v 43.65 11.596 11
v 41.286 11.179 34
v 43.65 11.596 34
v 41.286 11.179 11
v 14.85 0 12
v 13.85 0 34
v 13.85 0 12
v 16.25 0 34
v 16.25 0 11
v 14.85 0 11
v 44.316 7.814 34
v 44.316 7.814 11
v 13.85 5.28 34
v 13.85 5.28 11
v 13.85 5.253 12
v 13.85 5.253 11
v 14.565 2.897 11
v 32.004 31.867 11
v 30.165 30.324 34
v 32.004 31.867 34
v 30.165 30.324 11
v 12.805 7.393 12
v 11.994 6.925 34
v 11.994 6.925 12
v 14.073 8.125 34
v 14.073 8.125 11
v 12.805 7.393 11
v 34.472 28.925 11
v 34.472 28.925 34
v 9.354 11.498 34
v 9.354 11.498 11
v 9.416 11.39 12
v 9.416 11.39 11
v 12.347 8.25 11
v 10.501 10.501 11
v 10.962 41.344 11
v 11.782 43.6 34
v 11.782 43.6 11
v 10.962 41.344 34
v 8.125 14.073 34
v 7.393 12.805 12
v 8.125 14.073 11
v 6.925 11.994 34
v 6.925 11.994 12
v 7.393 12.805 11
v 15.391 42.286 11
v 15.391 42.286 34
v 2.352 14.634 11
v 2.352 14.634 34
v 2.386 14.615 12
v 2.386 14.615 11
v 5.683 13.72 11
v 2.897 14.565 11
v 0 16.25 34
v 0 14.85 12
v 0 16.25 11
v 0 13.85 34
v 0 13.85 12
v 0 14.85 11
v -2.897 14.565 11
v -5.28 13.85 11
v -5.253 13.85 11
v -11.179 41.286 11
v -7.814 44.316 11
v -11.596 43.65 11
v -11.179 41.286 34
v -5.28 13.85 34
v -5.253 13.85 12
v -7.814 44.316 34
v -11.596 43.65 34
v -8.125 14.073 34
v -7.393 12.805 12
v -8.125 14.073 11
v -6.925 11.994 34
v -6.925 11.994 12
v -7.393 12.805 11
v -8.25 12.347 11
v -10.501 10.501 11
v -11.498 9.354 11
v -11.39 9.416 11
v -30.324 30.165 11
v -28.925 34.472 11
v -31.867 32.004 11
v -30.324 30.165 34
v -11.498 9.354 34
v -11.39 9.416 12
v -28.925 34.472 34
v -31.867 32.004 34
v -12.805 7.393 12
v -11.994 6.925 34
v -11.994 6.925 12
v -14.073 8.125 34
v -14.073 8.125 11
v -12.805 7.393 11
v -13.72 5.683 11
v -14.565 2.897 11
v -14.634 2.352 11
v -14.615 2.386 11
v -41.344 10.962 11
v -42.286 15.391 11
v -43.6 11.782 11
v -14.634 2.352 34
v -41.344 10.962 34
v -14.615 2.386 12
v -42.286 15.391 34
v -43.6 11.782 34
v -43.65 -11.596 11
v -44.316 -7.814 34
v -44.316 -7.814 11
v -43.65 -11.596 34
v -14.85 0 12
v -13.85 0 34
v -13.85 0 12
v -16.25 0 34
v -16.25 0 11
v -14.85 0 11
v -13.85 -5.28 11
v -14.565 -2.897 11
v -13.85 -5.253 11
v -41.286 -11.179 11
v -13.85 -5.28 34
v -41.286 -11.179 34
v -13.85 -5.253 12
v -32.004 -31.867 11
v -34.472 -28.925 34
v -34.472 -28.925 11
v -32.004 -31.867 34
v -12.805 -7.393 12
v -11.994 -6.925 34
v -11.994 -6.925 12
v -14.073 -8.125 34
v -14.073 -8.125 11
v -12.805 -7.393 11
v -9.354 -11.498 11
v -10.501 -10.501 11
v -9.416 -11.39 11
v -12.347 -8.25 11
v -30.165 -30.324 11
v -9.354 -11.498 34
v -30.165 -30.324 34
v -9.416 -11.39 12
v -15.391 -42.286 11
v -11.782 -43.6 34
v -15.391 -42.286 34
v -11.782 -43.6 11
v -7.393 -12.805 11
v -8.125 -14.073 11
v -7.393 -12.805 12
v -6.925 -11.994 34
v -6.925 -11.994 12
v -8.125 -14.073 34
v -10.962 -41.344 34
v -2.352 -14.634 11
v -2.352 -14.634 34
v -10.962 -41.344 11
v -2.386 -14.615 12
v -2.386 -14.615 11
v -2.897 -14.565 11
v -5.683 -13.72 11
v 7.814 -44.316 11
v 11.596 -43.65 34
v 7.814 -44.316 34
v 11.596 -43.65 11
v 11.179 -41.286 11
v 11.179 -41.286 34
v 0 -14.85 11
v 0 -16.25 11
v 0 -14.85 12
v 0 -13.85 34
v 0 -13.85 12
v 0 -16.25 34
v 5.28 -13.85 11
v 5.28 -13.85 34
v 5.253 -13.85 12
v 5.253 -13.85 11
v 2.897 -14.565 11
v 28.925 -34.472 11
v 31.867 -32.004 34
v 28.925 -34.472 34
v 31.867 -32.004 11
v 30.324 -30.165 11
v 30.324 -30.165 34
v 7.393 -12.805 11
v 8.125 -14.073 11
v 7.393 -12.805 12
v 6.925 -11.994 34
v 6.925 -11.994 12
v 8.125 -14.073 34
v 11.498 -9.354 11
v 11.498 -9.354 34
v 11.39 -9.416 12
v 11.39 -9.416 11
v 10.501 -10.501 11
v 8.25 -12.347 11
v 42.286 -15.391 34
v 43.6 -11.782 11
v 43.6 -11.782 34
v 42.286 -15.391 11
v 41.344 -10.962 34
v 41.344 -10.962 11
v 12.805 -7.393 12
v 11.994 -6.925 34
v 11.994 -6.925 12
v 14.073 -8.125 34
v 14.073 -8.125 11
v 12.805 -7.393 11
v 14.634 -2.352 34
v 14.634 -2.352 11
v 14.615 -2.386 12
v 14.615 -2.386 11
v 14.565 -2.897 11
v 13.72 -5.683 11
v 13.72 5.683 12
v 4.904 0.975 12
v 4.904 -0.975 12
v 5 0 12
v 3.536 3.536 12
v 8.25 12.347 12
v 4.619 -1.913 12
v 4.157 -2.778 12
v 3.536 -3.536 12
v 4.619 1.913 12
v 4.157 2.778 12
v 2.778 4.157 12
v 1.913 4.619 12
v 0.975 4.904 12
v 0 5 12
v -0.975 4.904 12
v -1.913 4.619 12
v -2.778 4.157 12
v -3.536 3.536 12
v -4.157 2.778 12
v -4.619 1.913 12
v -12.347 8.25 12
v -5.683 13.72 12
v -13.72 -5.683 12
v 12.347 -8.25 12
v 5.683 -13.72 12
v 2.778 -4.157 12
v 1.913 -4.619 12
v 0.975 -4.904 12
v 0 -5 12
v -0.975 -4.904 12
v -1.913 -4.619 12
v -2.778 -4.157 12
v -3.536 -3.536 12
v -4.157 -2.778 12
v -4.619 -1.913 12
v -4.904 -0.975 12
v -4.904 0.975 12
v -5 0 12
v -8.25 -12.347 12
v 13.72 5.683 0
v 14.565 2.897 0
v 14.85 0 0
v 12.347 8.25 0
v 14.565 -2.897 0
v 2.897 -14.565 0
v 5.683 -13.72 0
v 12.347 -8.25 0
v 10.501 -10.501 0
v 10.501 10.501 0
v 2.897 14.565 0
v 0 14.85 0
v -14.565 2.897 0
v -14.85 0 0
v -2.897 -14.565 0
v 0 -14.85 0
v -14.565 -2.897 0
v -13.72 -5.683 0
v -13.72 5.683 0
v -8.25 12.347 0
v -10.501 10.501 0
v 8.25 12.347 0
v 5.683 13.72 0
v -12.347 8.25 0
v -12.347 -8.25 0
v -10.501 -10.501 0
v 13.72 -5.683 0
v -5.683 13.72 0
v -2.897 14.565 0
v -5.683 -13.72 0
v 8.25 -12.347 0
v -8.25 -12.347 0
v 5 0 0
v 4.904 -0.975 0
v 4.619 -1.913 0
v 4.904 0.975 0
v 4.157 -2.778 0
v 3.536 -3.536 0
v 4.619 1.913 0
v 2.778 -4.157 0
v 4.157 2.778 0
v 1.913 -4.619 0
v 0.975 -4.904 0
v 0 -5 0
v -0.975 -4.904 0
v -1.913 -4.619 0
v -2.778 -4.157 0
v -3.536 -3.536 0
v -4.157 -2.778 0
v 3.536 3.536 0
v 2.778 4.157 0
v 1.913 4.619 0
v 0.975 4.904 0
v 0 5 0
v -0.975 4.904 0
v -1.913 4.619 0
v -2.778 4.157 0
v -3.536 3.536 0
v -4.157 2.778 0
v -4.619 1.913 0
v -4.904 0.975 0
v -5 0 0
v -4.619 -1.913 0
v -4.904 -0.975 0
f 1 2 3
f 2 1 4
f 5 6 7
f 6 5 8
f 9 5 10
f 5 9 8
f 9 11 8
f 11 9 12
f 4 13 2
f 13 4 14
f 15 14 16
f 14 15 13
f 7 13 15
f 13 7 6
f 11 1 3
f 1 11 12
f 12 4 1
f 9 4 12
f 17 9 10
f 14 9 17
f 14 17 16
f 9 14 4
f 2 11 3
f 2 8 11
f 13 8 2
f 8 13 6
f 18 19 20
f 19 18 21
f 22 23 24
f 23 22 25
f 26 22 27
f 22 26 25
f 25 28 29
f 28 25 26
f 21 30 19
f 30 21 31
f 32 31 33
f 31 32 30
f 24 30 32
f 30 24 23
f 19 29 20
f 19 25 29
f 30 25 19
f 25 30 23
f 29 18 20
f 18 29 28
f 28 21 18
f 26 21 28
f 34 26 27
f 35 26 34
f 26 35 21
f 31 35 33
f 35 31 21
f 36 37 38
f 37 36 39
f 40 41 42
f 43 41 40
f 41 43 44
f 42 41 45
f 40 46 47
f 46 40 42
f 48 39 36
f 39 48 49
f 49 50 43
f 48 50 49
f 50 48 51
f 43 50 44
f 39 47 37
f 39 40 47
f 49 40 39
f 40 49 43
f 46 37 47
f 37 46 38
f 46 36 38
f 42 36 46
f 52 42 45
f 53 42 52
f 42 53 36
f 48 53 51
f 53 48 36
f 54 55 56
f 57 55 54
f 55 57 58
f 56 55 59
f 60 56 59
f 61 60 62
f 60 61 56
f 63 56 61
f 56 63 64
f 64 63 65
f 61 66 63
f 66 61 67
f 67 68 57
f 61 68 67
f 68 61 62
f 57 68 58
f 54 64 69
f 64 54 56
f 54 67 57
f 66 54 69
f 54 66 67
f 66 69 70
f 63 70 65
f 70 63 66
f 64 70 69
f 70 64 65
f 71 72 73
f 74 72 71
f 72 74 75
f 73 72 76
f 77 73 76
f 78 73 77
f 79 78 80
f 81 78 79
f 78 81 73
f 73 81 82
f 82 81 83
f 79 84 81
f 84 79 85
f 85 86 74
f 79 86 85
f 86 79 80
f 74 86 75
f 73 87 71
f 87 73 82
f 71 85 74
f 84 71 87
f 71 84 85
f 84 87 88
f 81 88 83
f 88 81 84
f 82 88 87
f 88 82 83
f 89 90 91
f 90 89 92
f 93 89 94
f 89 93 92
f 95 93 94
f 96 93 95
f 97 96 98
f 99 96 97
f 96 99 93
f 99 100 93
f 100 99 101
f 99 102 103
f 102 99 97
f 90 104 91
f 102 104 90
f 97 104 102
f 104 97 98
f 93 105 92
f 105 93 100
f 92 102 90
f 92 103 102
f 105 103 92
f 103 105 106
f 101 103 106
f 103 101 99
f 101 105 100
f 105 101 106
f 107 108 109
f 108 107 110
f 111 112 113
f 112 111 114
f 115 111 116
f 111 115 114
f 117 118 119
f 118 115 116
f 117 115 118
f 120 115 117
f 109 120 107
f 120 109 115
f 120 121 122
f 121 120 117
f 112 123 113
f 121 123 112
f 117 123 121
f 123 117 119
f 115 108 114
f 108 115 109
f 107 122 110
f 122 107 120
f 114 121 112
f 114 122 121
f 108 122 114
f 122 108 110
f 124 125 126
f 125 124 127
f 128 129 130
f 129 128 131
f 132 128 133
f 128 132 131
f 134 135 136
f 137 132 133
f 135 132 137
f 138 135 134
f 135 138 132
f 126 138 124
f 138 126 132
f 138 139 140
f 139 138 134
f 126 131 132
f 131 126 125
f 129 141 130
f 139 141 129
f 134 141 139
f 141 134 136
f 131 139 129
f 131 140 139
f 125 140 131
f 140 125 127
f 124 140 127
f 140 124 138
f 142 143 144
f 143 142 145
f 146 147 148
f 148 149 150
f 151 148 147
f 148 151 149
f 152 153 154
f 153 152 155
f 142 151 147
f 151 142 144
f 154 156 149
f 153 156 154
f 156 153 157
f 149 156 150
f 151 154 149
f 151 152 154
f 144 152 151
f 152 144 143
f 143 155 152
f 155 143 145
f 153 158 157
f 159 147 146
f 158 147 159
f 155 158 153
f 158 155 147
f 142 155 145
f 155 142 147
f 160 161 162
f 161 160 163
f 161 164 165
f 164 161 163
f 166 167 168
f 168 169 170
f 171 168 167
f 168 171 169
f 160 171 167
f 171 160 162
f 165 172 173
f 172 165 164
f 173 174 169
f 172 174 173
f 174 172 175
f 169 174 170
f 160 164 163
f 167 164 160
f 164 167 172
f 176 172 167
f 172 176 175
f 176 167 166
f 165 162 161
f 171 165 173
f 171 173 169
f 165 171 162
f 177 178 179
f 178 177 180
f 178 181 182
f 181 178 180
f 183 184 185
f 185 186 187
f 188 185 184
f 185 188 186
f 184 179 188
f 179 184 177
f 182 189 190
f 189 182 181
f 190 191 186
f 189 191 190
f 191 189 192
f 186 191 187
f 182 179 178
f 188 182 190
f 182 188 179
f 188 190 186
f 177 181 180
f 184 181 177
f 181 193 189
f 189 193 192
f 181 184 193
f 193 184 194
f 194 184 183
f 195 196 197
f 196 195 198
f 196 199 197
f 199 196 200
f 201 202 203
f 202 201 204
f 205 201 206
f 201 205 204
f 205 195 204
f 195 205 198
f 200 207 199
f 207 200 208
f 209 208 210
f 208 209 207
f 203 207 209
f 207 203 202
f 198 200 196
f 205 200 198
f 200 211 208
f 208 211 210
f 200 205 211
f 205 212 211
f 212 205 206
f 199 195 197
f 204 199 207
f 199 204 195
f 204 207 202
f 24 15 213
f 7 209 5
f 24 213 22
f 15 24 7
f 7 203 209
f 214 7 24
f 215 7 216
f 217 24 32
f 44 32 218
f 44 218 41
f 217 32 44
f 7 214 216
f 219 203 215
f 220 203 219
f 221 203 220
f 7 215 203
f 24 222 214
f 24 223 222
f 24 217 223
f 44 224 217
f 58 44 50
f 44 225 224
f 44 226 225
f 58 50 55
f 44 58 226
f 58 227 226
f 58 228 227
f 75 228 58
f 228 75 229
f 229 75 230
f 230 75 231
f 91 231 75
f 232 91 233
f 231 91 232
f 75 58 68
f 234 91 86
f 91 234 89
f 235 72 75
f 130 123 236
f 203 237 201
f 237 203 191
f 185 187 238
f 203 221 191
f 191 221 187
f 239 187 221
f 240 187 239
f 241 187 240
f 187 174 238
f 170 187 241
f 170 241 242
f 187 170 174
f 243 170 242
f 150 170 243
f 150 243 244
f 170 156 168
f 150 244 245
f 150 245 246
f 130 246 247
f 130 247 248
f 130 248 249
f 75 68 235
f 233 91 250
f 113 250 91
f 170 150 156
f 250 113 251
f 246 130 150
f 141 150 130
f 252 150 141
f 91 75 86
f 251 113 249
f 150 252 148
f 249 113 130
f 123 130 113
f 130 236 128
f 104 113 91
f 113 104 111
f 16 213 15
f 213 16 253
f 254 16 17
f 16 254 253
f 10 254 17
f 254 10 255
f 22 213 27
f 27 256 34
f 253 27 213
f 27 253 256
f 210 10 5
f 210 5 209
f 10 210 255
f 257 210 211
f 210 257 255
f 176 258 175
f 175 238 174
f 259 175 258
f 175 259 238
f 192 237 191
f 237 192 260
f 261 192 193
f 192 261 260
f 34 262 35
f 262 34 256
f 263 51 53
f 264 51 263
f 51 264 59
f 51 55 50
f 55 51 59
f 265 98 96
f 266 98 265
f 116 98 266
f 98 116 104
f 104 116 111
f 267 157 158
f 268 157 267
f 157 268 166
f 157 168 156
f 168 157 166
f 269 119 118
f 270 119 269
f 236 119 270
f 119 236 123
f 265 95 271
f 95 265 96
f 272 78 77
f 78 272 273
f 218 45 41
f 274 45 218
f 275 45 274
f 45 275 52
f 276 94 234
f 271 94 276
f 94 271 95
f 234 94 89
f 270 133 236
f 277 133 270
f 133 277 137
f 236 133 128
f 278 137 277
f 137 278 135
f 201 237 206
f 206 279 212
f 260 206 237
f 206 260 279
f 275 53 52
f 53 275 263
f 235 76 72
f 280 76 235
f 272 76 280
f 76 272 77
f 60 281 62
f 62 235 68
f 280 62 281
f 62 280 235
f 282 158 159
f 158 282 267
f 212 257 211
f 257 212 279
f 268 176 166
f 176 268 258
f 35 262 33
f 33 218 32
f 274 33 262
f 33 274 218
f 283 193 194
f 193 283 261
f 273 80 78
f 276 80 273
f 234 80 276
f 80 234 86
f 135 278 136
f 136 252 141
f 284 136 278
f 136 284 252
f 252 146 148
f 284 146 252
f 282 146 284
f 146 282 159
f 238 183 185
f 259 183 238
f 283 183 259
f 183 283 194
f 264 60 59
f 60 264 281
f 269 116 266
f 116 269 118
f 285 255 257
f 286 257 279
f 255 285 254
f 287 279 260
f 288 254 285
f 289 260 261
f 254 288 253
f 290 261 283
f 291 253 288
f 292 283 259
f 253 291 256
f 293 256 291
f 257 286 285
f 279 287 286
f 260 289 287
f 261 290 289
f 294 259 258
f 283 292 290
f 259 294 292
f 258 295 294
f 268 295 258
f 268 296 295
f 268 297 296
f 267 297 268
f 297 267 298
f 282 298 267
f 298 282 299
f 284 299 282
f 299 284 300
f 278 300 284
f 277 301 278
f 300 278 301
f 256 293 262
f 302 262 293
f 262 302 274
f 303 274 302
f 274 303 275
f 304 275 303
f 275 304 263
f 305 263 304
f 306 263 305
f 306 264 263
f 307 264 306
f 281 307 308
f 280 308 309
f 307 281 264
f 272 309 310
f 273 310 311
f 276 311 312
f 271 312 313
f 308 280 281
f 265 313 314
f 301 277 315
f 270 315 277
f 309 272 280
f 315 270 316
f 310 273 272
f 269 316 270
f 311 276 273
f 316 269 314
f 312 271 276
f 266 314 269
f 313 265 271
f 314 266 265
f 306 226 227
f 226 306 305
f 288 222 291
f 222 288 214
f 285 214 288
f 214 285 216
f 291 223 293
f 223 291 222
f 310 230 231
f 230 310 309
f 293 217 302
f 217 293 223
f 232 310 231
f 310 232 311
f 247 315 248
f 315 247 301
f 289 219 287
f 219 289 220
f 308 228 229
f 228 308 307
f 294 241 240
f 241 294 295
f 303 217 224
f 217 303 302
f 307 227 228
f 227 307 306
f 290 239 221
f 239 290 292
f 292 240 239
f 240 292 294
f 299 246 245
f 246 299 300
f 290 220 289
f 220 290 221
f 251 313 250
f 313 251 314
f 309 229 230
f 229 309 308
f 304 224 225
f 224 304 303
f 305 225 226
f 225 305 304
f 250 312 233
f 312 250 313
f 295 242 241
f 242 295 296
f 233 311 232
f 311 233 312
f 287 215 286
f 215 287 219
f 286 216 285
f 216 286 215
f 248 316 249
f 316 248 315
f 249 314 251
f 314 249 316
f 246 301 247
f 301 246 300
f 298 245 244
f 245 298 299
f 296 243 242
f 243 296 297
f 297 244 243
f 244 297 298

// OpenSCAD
$fn = 32;

// ----------------------------------------------------------------------
// Impeller: 90 mm, 12 blades, 34 mm tall
// ----------------------------------------------------------------------

// --- parameters (mm) ---
hub_d = 29.7;             // hub diameter
hub_h = 12;               // hub height
imp_d = 90;               // outer diameter over the blades
blades = 12;              // number of blades
blade_t = 2.4;            // blade thickness
blade_h = 22;             // blade height
blade_in_r = 13.85;       // blade root radius
blade_out_r = 42.6;       // blade tip radius
sweep = 10;               // blade sweep, degrees
bore_d = 10;              // shaft bore

module hub() {
  cylinder(h = hub_h, d = hub_d);
}

module blade() {
  /* blade swept between two boxes: hull of the root and the tip section */
  hull() {
    translate([blade_in_r, 0, hub_h - 1])
      cube([blade_t, blade_t * 2.2, blade_h + 1], center = false);
    rotate([0, 0, sweep])
      translate([blade_out_r, 0, hub_h - 1])
        cube([blade_t, blade_t * 1.6, blade_h + 1], center = false);
  }
}

module blades() {
  for (i = [0 : blades - 1])
    rotate([0, 0, i * 360 / blades]) blade();
}

difference() {
  union() {
    hub();
    blades();
  }
  translate([0, 0, -1]) cylinder(h = hub_h + blade_h + 0 + 3, d = bore_d);
}
